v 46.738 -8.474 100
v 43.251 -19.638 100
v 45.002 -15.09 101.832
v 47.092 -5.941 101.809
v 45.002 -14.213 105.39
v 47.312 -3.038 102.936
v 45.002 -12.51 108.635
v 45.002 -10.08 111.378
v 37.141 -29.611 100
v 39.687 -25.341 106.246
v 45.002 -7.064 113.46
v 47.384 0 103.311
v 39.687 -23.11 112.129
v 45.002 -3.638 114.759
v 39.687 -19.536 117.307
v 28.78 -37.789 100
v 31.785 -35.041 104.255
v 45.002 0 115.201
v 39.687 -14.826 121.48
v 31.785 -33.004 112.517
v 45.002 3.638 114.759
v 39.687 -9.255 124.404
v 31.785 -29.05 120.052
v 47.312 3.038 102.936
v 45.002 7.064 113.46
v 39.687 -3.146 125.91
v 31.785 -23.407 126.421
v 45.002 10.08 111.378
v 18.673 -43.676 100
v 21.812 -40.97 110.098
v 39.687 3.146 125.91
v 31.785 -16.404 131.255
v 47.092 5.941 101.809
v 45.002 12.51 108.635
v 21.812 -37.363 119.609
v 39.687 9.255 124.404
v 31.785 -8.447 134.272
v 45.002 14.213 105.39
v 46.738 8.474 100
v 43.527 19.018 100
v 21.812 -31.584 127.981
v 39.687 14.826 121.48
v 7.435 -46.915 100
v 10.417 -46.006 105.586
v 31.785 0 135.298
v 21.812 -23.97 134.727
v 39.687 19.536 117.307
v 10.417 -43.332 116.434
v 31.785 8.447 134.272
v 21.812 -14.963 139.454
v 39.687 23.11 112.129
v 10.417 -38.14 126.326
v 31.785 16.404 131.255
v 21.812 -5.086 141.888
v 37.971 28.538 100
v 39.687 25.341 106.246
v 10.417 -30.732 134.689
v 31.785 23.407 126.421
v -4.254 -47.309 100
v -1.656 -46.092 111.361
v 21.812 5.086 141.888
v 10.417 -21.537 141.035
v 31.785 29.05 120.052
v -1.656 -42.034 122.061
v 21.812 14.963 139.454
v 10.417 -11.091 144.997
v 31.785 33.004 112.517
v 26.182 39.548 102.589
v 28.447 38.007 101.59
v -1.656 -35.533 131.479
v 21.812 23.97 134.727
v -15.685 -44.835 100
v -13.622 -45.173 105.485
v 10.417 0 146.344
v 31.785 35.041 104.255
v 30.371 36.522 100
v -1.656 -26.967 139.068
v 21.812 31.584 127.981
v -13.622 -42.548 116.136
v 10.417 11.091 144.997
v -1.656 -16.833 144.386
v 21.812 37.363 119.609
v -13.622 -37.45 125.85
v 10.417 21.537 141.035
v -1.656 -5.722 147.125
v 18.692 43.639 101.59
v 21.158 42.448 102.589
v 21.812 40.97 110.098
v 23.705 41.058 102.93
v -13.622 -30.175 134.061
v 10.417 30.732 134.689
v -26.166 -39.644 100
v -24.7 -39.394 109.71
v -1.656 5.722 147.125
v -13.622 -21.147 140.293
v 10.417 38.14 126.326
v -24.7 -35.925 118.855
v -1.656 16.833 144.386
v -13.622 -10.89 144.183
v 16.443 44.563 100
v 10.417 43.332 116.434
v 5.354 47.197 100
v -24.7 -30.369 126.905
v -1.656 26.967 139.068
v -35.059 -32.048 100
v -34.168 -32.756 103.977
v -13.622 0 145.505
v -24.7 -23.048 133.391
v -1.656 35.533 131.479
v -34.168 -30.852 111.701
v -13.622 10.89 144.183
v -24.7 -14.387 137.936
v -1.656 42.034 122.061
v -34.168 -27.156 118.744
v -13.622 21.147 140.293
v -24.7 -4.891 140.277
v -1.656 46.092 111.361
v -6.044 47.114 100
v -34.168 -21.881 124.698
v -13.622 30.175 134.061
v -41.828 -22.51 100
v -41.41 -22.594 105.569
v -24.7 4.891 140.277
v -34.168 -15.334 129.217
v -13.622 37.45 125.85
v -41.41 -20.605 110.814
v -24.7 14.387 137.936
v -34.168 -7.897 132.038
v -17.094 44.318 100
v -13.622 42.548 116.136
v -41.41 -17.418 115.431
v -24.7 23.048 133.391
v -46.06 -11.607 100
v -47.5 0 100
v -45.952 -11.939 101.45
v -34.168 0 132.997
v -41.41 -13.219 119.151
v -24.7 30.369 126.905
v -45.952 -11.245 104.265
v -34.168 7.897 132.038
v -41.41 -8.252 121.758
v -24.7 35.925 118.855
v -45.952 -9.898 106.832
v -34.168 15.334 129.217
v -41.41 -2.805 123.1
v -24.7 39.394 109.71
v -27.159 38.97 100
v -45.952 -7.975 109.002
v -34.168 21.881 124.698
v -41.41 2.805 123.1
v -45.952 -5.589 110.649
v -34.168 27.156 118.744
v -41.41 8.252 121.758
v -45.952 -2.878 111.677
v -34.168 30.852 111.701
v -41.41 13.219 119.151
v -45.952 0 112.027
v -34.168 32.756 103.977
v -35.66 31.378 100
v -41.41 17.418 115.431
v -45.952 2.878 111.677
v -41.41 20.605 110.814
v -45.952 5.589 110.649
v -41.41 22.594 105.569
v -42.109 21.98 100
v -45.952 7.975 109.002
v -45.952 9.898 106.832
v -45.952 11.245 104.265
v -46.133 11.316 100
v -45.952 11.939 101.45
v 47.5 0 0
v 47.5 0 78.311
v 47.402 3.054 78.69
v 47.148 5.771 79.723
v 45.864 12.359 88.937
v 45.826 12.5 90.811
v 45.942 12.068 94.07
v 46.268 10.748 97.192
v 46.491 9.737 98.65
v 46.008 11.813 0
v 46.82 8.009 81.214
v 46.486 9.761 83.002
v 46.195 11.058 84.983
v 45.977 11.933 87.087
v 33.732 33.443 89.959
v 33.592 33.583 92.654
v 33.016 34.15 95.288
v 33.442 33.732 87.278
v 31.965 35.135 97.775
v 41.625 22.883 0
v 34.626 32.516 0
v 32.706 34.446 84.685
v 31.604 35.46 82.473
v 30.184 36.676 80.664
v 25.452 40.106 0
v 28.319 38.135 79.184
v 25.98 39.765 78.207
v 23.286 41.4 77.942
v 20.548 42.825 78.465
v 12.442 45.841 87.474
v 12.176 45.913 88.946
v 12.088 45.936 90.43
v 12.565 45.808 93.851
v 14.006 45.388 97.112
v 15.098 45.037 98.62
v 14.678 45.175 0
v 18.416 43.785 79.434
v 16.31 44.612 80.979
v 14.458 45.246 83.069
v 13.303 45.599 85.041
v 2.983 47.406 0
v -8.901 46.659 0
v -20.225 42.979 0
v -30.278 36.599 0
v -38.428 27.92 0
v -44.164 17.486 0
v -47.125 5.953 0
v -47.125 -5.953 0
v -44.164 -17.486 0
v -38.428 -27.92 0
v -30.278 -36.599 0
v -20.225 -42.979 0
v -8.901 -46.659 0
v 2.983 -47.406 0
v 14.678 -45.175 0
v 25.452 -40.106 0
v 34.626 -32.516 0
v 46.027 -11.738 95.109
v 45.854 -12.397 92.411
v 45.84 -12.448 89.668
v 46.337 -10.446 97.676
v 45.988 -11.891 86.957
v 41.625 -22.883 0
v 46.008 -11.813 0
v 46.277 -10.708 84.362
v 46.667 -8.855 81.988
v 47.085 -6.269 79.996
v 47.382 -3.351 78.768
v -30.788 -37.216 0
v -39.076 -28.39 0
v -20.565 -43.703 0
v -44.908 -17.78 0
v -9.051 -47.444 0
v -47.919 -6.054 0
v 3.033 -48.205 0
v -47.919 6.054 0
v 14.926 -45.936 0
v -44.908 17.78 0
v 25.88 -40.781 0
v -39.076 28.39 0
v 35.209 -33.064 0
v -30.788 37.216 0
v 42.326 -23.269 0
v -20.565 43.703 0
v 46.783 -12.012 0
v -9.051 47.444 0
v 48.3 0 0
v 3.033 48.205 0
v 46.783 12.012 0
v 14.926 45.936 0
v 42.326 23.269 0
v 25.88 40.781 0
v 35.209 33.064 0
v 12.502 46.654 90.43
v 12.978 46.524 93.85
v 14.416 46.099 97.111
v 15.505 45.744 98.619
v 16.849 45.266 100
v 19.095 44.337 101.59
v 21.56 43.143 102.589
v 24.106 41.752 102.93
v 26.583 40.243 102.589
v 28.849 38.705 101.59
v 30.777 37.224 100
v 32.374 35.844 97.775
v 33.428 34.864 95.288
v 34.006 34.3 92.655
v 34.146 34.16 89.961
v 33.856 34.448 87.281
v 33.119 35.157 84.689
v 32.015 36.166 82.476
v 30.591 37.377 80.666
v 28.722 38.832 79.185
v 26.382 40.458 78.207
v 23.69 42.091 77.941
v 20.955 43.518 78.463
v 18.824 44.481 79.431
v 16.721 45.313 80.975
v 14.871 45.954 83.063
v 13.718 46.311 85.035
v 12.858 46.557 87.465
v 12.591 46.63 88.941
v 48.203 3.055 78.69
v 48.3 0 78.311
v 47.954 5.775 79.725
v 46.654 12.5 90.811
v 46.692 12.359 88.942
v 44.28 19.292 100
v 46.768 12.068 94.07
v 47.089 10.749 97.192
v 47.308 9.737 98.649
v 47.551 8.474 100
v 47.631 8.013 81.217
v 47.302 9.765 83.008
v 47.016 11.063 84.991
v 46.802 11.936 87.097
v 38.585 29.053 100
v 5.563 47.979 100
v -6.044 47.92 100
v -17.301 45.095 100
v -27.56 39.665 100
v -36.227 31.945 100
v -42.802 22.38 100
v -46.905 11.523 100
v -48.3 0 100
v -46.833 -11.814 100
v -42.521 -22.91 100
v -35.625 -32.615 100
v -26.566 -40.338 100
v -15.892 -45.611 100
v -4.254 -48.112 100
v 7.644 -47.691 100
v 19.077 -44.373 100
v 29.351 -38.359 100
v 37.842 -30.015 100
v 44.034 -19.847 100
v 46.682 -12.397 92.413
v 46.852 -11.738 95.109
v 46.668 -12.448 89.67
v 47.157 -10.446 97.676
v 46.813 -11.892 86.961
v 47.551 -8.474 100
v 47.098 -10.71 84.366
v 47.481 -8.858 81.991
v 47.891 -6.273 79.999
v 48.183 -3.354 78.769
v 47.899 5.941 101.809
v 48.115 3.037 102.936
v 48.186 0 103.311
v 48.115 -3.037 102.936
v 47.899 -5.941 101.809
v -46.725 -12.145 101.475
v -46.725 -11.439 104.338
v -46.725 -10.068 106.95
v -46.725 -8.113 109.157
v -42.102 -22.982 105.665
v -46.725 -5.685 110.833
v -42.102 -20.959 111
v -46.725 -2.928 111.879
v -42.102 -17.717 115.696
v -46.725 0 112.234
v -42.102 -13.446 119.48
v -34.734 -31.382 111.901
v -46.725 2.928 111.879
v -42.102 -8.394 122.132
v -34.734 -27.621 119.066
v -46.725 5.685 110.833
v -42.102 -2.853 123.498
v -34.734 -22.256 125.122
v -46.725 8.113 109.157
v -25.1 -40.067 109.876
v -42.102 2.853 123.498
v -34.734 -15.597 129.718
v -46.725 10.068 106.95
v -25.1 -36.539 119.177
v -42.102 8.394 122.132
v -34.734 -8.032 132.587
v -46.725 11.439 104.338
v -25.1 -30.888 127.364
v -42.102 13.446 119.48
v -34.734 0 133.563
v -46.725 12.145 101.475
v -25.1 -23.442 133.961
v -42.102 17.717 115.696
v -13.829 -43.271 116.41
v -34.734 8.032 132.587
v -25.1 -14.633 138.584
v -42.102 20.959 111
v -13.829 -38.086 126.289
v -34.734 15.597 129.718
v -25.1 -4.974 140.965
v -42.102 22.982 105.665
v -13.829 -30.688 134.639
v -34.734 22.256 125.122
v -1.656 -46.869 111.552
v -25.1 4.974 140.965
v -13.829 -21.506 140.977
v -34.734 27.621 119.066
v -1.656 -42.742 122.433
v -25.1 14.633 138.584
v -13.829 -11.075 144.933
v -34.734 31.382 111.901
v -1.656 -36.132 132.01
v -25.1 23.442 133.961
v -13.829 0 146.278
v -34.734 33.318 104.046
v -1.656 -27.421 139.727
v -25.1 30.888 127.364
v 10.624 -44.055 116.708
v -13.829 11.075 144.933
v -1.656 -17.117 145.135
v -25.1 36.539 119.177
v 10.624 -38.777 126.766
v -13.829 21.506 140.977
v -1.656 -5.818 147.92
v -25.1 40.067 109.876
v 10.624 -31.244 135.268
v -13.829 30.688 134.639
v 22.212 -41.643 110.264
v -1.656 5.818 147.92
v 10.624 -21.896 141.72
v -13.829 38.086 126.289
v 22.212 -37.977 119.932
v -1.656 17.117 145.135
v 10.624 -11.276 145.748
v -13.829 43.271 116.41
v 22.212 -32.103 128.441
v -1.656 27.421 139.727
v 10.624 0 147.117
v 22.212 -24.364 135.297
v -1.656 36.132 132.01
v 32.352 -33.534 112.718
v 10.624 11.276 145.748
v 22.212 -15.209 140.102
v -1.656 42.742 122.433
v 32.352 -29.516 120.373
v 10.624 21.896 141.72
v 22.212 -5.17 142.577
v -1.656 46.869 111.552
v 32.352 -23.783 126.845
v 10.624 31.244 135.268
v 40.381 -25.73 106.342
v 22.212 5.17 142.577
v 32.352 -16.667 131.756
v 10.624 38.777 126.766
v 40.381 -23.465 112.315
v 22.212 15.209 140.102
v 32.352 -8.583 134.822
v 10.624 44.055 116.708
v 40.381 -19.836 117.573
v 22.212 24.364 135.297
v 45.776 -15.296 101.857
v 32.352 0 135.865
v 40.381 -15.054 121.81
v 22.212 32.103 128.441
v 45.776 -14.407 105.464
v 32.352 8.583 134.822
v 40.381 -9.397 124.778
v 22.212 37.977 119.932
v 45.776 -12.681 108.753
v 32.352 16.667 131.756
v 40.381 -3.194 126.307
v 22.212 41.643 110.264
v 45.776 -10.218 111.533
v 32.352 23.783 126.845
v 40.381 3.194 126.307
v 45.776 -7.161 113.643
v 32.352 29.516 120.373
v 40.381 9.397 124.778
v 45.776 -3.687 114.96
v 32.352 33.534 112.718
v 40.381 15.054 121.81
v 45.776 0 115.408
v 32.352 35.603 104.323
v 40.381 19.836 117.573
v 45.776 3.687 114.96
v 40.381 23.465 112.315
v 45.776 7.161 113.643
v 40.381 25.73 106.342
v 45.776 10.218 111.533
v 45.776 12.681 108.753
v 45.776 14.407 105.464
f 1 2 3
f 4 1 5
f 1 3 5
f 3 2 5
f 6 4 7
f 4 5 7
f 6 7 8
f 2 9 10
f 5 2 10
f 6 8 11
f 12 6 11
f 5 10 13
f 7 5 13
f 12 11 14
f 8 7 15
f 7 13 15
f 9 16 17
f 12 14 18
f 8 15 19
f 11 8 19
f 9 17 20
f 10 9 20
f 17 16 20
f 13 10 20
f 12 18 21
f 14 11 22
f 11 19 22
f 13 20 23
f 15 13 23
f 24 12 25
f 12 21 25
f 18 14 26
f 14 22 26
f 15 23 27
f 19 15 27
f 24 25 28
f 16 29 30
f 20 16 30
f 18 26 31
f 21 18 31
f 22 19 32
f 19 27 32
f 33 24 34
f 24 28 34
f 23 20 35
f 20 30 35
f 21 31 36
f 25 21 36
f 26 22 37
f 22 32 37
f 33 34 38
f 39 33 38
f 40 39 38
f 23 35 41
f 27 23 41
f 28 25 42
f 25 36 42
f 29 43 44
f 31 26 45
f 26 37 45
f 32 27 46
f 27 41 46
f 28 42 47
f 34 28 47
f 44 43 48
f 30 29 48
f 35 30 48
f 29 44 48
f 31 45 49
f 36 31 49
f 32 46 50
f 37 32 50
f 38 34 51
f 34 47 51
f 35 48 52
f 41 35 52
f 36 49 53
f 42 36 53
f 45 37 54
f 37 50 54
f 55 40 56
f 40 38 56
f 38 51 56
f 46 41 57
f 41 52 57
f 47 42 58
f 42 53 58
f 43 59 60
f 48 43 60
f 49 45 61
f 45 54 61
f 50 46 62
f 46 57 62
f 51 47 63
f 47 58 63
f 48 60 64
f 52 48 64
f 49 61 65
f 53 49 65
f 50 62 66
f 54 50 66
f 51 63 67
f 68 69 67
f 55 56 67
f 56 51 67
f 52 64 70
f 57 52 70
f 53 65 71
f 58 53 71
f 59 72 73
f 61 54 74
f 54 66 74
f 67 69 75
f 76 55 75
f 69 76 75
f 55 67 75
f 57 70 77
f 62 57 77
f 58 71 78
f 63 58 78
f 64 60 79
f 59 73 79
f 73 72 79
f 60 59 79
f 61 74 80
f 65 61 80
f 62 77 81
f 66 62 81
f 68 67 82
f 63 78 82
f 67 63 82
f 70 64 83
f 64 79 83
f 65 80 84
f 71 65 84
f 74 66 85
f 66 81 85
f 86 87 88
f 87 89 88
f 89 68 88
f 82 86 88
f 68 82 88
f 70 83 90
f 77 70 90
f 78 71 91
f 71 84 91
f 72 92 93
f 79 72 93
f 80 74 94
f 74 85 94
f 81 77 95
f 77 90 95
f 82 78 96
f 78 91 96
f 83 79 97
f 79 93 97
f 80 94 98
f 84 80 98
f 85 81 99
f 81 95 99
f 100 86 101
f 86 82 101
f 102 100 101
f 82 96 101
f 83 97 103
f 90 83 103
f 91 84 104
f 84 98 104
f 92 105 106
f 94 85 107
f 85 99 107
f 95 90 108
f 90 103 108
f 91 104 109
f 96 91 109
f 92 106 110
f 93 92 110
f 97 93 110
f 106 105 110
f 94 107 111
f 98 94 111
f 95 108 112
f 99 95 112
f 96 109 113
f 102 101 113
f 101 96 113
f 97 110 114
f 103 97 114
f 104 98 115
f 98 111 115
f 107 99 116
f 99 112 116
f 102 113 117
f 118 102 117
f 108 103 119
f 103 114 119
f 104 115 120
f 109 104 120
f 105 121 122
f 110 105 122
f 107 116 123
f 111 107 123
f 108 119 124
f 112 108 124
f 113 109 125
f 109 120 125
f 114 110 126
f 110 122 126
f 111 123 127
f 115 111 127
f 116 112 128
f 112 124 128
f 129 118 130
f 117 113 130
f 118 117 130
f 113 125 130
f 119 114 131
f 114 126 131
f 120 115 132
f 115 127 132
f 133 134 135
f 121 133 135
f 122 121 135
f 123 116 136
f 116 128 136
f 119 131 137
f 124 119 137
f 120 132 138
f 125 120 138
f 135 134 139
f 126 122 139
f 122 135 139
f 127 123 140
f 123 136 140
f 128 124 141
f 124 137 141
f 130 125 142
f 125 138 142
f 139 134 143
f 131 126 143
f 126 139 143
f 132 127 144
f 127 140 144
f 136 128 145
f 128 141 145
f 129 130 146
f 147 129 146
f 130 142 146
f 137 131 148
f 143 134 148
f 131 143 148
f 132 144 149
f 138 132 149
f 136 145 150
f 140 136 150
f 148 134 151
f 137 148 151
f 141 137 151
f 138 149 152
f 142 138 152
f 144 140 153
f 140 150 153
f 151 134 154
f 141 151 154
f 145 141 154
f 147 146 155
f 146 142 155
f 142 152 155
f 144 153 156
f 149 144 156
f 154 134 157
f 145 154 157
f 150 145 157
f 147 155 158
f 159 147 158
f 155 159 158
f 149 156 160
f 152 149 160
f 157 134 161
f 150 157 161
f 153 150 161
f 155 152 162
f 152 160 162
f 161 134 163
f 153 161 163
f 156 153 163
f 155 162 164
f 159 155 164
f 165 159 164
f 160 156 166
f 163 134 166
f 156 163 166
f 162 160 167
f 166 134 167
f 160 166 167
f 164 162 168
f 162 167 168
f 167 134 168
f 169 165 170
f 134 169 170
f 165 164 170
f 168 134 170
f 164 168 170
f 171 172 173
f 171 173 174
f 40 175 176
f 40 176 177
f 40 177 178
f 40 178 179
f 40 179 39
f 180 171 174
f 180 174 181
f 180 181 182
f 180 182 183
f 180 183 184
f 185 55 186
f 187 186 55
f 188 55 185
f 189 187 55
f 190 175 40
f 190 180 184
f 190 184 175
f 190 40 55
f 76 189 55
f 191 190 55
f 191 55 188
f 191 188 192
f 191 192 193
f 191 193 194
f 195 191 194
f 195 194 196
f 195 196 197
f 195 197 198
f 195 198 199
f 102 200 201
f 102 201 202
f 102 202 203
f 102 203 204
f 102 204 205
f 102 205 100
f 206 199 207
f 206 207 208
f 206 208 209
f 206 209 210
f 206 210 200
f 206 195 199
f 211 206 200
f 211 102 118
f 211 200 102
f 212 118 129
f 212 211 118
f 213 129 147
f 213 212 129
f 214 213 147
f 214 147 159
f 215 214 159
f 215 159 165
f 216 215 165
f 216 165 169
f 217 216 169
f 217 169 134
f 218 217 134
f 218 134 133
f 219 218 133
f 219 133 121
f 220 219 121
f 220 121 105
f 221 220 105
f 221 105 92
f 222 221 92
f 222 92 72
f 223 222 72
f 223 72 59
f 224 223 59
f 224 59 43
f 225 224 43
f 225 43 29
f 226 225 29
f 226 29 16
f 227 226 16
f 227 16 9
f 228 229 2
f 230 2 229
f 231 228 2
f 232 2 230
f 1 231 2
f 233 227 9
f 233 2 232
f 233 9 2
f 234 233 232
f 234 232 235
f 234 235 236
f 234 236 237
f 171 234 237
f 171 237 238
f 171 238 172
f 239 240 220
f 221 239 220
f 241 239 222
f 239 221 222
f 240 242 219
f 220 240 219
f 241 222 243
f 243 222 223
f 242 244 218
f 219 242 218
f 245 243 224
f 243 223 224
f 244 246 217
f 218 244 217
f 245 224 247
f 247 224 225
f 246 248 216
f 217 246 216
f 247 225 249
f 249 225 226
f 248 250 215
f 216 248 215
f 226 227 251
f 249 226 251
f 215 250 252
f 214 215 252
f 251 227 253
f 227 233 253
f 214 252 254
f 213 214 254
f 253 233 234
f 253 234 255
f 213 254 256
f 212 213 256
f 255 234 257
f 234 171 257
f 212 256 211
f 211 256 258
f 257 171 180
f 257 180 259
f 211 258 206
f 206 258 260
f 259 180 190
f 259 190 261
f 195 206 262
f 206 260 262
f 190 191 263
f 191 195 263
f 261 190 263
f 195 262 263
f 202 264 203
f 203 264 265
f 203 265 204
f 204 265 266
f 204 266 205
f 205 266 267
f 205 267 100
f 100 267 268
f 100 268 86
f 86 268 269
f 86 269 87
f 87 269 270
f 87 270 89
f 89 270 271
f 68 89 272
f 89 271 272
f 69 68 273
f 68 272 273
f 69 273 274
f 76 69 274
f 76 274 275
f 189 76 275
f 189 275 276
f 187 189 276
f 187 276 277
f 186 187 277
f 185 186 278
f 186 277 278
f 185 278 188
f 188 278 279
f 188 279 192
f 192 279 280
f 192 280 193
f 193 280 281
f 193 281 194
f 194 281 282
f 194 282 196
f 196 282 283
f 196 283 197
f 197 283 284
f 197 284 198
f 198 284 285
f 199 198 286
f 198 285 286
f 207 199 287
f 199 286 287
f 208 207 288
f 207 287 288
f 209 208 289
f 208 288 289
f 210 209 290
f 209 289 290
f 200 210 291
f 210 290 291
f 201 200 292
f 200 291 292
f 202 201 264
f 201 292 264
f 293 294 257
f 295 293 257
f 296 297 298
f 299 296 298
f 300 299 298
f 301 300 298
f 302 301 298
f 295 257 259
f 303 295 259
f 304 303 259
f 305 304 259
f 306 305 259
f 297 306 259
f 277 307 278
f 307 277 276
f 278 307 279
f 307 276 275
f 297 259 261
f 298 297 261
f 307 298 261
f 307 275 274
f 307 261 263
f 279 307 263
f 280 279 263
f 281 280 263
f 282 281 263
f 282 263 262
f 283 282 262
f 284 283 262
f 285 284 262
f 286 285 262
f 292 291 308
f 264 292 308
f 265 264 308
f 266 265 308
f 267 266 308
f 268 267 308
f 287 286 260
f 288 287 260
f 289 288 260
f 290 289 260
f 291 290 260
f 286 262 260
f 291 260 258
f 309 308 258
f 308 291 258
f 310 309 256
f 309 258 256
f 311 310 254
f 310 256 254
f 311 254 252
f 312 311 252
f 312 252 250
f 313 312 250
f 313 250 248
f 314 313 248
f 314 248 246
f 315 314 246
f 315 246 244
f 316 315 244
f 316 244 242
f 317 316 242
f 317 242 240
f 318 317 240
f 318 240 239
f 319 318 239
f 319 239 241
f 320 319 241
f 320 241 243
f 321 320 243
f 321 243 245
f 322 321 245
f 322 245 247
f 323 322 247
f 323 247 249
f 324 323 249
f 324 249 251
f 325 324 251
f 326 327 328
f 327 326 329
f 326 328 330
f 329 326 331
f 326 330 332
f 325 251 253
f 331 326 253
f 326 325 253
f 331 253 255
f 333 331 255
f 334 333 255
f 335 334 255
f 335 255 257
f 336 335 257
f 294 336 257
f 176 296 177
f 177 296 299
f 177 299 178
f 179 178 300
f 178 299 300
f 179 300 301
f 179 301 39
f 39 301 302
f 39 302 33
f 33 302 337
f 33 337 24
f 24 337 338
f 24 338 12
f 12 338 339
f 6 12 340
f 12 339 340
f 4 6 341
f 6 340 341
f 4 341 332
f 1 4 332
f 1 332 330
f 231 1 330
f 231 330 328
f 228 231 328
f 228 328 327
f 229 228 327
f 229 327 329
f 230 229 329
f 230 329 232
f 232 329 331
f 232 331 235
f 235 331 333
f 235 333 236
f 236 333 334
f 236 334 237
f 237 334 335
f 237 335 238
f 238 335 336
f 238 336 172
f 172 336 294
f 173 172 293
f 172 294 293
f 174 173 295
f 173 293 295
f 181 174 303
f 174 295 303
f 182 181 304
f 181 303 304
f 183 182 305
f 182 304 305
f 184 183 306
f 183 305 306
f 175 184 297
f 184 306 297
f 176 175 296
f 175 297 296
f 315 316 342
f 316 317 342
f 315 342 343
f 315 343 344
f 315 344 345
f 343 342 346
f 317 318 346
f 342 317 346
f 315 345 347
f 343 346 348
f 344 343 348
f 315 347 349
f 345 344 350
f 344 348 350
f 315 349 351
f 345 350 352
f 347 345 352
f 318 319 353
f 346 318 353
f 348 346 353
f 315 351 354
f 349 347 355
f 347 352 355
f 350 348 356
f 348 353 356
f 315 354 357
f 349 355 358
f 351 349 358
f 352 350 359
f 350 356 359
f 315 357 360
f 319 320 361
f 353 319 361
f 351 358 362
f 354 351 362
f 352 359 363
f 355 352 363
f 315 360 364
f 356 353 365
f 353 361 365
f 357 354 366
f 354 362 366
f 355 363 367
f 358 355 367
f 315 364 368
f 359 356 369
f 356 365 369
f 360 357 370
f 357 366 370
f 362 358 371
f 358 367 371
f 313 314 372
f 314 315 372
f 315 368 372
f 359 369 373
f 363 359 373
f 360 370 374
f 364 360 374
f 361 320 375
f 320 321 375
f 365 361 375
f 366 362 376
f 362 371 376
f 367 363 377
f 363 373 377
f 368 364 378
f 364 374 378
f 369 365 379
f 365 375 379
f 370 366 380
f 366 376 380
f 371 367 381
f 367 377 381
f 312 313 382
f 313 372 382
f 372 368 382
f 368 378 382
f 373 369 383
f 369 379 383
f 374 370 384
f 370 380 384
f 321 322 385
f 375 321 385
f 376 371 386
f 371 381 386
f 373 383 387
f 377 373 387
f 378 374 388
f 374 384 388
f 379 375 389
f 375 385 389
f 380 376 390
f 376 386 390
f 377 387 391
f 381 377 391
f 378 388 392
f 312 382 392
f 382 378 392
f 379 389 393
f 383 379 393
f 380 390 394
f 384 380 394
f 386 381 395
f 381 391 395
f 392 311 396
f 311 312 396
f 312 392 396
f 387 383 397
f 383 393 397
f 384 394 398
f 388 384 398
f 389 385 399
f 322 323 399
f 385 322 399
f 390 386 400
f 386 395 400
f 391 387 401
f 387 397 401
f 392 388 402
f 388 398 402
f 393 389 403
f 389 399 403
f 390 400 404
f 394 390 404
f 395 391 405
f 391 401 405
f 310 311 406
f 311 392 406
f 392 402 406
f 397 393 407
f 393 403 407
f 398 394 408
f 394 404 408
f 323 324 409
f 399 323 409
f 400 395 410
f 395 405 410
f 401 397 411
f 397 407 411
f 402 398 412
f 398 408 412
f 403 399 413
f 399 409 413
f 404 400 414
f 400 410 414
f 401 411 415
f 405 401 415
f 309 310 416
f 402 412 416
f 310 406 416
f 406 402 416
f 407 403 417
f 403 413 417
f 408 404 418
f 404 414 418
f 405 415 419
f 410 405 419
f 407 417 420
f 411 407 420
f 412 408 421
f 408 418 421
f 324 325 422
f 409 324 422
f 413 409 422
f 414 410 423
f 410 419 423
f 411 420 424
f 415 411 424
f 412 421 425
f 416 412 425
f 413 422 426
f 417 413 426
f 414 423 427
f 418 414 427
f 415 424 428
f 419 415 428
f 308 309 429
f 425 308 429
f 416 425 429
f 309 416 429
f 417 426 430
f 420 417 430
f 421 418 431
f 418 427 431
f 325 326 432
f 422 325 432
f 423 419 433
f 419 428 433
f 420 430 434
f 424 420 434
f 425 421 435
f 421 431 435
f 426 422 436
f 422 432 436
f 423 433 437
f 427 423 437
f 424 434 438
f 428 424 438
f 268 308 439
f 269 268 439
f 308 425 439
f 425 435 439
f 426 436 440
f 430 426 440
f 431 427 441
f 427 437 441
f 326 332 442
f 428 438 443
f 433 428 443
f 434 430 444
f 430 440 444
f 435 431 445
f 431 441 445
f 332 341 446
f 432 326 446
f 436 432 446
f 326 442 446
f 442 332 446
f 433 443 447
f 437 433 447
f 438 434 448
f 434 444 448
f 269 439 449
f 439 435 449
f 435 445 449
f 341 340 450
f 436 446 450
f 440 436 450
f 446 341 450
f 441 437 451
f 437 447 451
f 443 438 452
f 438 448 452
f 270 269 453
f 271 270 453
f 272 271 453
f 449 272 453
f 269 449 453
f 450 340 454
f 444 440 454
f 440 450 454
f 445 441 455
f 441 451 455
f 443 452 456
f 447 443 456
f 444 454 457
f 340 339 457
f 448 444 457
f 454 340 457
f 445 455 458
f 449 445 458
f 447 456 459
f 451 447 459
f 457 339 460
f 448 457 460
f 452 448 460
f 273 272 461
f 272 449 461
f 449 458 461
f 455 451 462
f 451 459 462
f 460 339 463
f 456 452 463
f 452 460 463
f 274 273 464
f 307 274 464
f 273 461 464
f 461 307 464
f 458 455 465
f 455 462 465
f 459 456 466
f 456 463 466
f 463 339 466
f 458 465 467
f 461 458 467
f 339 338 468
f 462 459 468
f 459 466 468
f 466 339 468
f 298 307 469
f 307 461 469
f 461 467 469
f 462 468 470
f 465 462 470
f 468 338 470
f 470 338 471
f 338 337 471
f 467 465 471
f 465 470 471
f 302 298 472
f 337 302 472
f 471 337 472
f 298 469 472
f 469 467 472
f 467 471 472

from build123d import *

# Parameters (mm, degrees)
F0_R      = 48.3
F0_R_2    = 47.5
F1_DEPTH  = 100
F3_ANGLE  = 180
F5_R      = 12.5
F6_DEPTH  = 6
F9_R      = 12.5
F10_DEPTH = 6


with BuildPart() as f1:
    # F0 (on Top) → F1 (new body)
    with BuildSketch(Plane.XY):
        Circle(F0_R)
        Circle(F0_R_2, mode=Mode.SUBTRACT)
    extrude(amount=F1_DEPTH)

    # F2 (on face) → F3 (revolve)
    with BuildSketch(Plane.XY.offset(100)):
        with BuildLine():
            ThreePointArc((47.5, 0), (0, -47.5), (-47.5, 0))
            Line((-47.5, 0), (-48.3, 0))
            ThreePointArc((-48.3, 0), (0, -48.3), (48.3, 0))
            Line((48.3, 0), (47.5, 0))
        make_face()
    revolve(axis=Axis((-47.9, 0, 100), (-1, 0, 0)), revolution_arc=F3_ANGLE)

    # F5 (on offset) → F6 (cut)
    with BuildSketch(Plane.YZ.offset(49)):
        with Locations((0, 90.8108726144)):
            Circle(F5_R)
    extrude(amount=-F6_DEPTH, mode=Mode.SUBTRACT)

    # F9 (on face) → F10 (cut)
    with BuildSketch(Plane(origin=(24.5, 42.4352447854, 0), x_dir=(-0.8660254038, 0.5, 0), z_dir=(0.5, 0.8660254038, 0))):
        with Locations((0, 90.4301926494)):
            Circle(F9_R)
    extrude(amount=-F10_DEPTH, mode=Mode.SUBTRACT)


solid = f1.part
